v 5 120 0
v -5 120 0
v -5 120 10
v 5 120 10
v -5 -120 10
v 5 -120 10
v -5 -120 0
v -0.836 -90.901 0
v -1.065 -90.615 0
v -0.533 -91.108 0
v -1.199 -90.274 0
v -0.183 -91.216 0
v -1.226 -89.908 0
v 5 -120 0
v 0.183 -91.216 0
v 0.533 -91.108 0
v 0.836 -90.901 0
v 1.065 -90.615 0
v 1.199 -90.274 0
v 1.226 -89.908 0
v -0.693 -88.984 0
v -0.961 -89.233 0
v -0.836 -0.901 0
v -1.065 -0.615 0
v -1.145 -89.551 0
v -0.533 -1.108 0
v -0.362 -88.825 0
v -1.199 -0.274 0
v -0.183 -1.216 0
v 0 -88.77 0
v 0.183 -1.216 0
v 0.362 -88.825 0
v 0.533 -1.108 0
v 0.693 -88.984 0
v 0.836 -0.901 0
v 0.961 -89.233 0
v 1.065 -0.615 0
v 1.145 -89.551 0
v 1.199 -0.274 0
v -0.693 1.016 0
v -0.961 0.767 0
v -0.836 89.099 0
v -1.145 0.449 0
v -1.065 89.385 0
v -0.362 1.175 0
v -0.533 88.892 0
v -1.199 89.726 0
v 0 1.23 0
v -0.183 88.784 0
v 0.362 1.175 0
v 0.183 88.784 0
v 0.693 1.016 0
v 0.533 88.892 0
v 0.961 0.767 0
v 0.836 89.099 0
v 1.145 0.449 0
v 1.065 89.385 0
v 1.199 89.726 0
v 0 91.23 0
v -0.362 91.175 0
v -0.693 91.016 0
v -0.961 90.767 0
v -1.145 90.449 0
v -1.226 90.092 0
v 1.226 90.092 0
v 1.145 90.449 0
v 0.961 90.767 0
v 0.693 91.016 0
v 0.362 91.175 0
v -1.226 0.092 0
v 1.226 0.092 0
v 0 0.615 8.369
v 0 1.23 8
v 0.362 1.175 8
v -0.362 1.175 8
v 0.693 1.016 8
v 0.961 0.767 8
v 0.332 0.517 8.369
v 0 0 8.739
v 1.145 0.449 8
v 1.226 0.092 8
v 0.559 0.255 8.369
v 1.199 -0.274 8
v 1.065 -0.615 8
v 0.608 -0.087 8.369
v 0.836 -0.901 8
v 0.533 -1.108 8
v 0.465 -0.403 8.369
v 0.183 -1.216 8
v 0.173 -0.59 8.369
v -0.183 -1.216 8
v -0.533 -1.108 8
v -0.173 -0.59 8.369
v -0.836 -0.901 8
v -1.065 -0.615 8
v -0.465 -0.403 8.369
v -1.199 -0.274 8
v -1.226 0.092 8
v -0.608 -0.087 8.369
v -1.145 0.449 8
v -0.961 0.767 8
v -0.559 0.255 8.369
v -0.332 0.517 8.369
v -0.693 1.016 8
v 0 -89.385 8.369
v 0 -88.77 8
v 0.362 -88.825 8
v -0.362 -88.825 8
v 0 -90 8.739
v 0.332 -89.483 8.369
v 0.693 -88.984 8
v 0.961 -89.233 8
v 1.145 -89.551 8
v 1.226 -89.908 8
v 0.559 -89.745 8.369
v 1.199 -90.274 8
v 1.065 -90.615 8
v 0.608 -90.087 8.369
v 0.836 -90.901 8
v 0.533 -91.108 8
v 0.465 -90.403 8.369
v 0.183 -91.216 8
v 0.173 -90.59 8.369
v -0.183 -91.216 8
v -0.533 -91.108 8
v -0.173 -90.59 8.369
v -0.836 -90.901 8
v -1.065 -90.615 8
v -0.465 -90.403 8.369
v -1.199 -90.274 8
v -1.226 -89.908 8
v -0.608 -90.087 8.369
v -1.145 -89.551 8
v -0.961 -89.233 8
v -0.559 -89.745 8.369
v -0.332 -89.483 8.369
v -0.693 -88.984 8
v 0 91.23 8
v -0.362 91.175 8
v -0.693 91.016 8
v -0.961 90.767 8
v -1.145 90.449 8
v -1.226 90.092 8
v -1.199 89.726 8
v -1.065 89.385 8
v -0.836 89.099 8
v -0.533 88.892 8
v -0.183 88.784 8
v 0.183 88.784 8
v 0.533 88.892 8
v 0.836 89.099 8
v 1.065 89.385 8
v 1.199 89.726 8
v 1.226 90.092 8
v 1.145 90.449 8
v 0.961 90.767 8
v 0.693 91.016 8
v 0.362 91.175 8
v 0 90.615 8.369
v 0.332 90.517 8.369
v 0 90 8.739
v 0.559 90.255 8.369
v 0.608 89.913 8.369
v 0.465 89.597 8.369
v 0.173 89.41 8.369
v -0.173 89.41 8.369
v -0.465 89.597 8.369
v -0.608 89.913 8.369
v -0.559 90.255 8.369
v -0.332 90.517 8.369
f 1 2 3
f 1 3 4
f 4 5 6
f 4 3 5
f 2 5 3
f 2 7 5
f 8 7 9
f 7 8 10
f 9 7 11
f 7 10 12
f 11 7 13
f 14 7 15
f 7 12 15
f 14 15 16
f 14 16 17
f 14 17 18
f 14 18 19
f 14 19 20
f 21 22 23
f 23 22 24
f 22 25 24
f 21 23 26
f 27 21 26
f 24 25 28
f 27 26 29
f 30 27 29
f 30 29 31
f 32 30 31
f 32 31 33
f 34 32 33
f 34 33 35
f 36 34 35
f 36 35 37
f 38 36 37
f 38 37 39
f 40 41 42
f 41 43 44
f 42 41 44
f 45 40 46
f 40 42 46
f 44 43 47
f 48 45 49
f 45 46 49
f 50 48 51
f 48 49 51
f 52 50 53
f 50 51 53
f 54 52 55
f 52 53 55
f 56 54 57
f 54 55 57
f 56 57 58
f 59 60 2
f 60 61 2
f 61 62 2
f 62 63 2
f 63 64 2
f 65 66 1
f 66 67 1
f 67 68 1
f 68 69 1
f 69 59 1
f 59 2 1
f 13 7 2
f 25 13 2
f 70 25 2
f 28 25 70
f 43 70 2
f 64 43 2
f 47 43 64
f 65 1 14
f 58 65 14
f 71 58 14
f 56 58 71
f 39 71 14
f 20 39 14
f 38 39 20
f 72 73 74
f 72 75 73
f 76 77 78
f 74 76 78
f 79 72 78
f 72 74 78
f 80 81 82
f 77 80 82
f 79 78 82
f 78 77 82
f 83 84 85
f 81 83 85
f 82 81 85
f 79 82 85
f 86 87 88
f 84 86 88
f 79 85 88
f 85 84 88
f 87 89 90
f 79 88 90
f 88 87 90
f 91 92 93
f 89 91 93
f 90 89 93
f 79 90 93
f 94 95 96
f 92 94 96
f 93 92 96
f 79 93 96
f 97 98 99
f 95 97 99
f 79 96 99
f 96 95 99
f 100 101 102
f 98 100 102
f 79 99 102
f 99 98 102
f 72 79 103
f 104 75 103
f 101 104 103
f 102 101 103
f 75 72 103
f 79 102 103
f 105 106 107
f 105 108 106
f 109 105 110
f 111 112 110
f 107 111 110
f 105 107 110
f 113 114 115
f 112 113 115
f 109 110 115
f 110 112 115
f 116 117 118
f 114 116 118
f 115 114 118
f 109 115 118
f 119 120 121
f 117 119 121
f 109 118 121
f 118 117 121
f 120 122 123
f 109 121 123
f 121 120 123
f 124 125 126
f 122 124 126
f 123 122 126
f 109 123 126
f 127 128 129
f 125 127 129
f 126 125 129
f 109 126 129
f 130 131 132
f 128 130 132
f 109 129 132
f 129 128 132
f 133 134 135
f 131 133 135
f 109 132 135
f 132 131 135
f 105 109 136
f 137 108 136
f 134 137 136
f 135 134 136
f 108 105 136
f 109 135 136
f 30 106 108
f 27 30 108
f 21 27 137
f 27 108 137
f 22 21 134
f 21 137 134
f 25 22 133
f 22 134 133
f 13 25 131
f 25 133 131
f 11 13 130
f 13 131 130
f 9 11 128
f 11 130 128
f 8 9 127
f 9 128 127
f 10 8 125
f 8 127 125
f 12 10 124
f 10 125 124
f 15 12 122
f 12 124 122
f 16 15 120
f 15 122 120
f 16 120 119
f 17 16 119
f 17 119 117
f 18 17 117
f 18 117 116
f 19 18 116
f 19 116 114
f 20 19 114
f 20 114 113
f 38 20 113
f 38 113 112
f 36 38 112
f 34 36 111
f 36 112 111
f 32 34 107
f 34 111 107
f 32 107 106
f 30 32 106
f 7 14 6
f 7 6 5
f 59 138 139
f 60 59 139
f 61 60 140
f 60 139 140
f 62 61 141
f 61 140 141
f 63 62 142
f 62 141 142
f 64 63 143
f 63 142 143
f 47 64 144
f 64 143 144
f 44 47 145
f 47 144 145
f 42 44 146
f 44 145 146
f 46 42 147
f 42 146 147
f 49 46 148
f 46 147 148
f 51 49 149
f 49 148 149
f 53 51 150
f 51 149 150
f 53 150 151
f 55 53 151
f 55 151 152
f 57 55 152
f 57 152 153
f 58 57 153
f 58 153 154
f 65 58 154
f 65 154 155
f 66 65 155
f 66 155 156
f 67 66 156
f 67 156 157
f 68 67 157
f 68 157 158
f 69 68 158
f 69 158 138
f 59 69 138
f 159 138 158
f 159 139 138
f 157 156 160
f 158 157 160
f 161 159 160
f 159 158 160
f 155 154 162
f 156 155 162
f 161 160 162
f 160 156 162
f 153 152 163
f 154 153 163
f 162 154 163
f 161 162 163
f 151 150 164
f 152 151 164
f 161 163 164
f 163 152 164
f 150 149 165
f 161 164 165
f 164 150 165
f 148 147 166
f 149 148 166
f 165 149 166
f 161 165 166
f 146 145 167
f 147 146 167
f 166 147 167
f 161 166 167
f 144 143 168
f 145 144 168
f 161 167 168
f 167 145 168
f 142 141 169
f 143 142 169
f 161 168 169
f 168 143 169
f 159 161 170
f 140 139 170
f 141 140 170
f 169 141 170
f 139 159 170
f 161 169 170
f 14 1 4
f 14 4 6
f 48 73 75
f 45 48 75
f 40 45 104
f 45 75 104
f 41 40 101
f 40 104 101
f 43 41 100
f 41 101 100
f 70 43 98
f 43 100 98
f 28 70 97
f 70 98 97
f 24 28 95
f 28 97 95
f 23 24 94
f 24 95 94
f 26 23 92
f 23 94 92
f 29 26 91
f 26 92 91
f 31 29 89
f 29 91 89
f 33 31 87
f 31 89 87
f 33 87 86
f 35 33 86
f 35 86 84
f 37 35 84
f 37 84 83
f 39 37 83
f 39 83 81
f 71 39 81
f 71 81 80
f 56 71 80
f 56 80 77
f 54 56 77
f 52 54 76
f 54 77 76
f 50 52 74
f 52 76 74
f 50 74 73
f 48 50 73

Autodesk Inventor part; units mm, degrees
ref_plane "YZ Plane" through (0, 0, 0) normal (1, 0, 0) x (0, 1, 0)
ref_plane "XZ Plane" through (0, 0, 0) normal (0, 1, 0) x (-1, 0, 0)
ref_plane "XY Plane" through (0, 0, 0) normal (0, 0, 1) x (1, 0, 0)
sketch "Esboço1" plane through (0, 0, 0) normal (0, 0, 1) x (1, 0, 0)
  line L0 (-7, 0) -> (7, 0) construction
  line L1 (0, -168) -> (0, 168) construction
  line L2 (-5, 120) -> (5, 120)
  line L3 (5, 120) -> (5, -120)
  line L4 (5, -120) -> (-5, -120)
  line L5 (-5, -120) -> (-5, 120)
  point P0 (0, 0)
  point P1 (0, -90)
  point P2 (0, 0)
  point P3 (0, 90)
  dimension "d0" = 10
  dimension "d1" = 240
  dimension "d4" = 90
  dimension "d12" = 30
extrude "Extrusão1" add sketch "Esboço1" along normal blind 10
hole "Furo1" at (0, -90, 0) at (0, 0, 0) at (0, 90, 0) direction (0, 0, 1) diameter 2.459 depth 8 tip angle 118 thread size "M3x0.5" class "6H" standard "ISO Metric profile"
equation "\"d2\" = d0"
properties part number "VEJ-00-013A" material "Durastone BK"
